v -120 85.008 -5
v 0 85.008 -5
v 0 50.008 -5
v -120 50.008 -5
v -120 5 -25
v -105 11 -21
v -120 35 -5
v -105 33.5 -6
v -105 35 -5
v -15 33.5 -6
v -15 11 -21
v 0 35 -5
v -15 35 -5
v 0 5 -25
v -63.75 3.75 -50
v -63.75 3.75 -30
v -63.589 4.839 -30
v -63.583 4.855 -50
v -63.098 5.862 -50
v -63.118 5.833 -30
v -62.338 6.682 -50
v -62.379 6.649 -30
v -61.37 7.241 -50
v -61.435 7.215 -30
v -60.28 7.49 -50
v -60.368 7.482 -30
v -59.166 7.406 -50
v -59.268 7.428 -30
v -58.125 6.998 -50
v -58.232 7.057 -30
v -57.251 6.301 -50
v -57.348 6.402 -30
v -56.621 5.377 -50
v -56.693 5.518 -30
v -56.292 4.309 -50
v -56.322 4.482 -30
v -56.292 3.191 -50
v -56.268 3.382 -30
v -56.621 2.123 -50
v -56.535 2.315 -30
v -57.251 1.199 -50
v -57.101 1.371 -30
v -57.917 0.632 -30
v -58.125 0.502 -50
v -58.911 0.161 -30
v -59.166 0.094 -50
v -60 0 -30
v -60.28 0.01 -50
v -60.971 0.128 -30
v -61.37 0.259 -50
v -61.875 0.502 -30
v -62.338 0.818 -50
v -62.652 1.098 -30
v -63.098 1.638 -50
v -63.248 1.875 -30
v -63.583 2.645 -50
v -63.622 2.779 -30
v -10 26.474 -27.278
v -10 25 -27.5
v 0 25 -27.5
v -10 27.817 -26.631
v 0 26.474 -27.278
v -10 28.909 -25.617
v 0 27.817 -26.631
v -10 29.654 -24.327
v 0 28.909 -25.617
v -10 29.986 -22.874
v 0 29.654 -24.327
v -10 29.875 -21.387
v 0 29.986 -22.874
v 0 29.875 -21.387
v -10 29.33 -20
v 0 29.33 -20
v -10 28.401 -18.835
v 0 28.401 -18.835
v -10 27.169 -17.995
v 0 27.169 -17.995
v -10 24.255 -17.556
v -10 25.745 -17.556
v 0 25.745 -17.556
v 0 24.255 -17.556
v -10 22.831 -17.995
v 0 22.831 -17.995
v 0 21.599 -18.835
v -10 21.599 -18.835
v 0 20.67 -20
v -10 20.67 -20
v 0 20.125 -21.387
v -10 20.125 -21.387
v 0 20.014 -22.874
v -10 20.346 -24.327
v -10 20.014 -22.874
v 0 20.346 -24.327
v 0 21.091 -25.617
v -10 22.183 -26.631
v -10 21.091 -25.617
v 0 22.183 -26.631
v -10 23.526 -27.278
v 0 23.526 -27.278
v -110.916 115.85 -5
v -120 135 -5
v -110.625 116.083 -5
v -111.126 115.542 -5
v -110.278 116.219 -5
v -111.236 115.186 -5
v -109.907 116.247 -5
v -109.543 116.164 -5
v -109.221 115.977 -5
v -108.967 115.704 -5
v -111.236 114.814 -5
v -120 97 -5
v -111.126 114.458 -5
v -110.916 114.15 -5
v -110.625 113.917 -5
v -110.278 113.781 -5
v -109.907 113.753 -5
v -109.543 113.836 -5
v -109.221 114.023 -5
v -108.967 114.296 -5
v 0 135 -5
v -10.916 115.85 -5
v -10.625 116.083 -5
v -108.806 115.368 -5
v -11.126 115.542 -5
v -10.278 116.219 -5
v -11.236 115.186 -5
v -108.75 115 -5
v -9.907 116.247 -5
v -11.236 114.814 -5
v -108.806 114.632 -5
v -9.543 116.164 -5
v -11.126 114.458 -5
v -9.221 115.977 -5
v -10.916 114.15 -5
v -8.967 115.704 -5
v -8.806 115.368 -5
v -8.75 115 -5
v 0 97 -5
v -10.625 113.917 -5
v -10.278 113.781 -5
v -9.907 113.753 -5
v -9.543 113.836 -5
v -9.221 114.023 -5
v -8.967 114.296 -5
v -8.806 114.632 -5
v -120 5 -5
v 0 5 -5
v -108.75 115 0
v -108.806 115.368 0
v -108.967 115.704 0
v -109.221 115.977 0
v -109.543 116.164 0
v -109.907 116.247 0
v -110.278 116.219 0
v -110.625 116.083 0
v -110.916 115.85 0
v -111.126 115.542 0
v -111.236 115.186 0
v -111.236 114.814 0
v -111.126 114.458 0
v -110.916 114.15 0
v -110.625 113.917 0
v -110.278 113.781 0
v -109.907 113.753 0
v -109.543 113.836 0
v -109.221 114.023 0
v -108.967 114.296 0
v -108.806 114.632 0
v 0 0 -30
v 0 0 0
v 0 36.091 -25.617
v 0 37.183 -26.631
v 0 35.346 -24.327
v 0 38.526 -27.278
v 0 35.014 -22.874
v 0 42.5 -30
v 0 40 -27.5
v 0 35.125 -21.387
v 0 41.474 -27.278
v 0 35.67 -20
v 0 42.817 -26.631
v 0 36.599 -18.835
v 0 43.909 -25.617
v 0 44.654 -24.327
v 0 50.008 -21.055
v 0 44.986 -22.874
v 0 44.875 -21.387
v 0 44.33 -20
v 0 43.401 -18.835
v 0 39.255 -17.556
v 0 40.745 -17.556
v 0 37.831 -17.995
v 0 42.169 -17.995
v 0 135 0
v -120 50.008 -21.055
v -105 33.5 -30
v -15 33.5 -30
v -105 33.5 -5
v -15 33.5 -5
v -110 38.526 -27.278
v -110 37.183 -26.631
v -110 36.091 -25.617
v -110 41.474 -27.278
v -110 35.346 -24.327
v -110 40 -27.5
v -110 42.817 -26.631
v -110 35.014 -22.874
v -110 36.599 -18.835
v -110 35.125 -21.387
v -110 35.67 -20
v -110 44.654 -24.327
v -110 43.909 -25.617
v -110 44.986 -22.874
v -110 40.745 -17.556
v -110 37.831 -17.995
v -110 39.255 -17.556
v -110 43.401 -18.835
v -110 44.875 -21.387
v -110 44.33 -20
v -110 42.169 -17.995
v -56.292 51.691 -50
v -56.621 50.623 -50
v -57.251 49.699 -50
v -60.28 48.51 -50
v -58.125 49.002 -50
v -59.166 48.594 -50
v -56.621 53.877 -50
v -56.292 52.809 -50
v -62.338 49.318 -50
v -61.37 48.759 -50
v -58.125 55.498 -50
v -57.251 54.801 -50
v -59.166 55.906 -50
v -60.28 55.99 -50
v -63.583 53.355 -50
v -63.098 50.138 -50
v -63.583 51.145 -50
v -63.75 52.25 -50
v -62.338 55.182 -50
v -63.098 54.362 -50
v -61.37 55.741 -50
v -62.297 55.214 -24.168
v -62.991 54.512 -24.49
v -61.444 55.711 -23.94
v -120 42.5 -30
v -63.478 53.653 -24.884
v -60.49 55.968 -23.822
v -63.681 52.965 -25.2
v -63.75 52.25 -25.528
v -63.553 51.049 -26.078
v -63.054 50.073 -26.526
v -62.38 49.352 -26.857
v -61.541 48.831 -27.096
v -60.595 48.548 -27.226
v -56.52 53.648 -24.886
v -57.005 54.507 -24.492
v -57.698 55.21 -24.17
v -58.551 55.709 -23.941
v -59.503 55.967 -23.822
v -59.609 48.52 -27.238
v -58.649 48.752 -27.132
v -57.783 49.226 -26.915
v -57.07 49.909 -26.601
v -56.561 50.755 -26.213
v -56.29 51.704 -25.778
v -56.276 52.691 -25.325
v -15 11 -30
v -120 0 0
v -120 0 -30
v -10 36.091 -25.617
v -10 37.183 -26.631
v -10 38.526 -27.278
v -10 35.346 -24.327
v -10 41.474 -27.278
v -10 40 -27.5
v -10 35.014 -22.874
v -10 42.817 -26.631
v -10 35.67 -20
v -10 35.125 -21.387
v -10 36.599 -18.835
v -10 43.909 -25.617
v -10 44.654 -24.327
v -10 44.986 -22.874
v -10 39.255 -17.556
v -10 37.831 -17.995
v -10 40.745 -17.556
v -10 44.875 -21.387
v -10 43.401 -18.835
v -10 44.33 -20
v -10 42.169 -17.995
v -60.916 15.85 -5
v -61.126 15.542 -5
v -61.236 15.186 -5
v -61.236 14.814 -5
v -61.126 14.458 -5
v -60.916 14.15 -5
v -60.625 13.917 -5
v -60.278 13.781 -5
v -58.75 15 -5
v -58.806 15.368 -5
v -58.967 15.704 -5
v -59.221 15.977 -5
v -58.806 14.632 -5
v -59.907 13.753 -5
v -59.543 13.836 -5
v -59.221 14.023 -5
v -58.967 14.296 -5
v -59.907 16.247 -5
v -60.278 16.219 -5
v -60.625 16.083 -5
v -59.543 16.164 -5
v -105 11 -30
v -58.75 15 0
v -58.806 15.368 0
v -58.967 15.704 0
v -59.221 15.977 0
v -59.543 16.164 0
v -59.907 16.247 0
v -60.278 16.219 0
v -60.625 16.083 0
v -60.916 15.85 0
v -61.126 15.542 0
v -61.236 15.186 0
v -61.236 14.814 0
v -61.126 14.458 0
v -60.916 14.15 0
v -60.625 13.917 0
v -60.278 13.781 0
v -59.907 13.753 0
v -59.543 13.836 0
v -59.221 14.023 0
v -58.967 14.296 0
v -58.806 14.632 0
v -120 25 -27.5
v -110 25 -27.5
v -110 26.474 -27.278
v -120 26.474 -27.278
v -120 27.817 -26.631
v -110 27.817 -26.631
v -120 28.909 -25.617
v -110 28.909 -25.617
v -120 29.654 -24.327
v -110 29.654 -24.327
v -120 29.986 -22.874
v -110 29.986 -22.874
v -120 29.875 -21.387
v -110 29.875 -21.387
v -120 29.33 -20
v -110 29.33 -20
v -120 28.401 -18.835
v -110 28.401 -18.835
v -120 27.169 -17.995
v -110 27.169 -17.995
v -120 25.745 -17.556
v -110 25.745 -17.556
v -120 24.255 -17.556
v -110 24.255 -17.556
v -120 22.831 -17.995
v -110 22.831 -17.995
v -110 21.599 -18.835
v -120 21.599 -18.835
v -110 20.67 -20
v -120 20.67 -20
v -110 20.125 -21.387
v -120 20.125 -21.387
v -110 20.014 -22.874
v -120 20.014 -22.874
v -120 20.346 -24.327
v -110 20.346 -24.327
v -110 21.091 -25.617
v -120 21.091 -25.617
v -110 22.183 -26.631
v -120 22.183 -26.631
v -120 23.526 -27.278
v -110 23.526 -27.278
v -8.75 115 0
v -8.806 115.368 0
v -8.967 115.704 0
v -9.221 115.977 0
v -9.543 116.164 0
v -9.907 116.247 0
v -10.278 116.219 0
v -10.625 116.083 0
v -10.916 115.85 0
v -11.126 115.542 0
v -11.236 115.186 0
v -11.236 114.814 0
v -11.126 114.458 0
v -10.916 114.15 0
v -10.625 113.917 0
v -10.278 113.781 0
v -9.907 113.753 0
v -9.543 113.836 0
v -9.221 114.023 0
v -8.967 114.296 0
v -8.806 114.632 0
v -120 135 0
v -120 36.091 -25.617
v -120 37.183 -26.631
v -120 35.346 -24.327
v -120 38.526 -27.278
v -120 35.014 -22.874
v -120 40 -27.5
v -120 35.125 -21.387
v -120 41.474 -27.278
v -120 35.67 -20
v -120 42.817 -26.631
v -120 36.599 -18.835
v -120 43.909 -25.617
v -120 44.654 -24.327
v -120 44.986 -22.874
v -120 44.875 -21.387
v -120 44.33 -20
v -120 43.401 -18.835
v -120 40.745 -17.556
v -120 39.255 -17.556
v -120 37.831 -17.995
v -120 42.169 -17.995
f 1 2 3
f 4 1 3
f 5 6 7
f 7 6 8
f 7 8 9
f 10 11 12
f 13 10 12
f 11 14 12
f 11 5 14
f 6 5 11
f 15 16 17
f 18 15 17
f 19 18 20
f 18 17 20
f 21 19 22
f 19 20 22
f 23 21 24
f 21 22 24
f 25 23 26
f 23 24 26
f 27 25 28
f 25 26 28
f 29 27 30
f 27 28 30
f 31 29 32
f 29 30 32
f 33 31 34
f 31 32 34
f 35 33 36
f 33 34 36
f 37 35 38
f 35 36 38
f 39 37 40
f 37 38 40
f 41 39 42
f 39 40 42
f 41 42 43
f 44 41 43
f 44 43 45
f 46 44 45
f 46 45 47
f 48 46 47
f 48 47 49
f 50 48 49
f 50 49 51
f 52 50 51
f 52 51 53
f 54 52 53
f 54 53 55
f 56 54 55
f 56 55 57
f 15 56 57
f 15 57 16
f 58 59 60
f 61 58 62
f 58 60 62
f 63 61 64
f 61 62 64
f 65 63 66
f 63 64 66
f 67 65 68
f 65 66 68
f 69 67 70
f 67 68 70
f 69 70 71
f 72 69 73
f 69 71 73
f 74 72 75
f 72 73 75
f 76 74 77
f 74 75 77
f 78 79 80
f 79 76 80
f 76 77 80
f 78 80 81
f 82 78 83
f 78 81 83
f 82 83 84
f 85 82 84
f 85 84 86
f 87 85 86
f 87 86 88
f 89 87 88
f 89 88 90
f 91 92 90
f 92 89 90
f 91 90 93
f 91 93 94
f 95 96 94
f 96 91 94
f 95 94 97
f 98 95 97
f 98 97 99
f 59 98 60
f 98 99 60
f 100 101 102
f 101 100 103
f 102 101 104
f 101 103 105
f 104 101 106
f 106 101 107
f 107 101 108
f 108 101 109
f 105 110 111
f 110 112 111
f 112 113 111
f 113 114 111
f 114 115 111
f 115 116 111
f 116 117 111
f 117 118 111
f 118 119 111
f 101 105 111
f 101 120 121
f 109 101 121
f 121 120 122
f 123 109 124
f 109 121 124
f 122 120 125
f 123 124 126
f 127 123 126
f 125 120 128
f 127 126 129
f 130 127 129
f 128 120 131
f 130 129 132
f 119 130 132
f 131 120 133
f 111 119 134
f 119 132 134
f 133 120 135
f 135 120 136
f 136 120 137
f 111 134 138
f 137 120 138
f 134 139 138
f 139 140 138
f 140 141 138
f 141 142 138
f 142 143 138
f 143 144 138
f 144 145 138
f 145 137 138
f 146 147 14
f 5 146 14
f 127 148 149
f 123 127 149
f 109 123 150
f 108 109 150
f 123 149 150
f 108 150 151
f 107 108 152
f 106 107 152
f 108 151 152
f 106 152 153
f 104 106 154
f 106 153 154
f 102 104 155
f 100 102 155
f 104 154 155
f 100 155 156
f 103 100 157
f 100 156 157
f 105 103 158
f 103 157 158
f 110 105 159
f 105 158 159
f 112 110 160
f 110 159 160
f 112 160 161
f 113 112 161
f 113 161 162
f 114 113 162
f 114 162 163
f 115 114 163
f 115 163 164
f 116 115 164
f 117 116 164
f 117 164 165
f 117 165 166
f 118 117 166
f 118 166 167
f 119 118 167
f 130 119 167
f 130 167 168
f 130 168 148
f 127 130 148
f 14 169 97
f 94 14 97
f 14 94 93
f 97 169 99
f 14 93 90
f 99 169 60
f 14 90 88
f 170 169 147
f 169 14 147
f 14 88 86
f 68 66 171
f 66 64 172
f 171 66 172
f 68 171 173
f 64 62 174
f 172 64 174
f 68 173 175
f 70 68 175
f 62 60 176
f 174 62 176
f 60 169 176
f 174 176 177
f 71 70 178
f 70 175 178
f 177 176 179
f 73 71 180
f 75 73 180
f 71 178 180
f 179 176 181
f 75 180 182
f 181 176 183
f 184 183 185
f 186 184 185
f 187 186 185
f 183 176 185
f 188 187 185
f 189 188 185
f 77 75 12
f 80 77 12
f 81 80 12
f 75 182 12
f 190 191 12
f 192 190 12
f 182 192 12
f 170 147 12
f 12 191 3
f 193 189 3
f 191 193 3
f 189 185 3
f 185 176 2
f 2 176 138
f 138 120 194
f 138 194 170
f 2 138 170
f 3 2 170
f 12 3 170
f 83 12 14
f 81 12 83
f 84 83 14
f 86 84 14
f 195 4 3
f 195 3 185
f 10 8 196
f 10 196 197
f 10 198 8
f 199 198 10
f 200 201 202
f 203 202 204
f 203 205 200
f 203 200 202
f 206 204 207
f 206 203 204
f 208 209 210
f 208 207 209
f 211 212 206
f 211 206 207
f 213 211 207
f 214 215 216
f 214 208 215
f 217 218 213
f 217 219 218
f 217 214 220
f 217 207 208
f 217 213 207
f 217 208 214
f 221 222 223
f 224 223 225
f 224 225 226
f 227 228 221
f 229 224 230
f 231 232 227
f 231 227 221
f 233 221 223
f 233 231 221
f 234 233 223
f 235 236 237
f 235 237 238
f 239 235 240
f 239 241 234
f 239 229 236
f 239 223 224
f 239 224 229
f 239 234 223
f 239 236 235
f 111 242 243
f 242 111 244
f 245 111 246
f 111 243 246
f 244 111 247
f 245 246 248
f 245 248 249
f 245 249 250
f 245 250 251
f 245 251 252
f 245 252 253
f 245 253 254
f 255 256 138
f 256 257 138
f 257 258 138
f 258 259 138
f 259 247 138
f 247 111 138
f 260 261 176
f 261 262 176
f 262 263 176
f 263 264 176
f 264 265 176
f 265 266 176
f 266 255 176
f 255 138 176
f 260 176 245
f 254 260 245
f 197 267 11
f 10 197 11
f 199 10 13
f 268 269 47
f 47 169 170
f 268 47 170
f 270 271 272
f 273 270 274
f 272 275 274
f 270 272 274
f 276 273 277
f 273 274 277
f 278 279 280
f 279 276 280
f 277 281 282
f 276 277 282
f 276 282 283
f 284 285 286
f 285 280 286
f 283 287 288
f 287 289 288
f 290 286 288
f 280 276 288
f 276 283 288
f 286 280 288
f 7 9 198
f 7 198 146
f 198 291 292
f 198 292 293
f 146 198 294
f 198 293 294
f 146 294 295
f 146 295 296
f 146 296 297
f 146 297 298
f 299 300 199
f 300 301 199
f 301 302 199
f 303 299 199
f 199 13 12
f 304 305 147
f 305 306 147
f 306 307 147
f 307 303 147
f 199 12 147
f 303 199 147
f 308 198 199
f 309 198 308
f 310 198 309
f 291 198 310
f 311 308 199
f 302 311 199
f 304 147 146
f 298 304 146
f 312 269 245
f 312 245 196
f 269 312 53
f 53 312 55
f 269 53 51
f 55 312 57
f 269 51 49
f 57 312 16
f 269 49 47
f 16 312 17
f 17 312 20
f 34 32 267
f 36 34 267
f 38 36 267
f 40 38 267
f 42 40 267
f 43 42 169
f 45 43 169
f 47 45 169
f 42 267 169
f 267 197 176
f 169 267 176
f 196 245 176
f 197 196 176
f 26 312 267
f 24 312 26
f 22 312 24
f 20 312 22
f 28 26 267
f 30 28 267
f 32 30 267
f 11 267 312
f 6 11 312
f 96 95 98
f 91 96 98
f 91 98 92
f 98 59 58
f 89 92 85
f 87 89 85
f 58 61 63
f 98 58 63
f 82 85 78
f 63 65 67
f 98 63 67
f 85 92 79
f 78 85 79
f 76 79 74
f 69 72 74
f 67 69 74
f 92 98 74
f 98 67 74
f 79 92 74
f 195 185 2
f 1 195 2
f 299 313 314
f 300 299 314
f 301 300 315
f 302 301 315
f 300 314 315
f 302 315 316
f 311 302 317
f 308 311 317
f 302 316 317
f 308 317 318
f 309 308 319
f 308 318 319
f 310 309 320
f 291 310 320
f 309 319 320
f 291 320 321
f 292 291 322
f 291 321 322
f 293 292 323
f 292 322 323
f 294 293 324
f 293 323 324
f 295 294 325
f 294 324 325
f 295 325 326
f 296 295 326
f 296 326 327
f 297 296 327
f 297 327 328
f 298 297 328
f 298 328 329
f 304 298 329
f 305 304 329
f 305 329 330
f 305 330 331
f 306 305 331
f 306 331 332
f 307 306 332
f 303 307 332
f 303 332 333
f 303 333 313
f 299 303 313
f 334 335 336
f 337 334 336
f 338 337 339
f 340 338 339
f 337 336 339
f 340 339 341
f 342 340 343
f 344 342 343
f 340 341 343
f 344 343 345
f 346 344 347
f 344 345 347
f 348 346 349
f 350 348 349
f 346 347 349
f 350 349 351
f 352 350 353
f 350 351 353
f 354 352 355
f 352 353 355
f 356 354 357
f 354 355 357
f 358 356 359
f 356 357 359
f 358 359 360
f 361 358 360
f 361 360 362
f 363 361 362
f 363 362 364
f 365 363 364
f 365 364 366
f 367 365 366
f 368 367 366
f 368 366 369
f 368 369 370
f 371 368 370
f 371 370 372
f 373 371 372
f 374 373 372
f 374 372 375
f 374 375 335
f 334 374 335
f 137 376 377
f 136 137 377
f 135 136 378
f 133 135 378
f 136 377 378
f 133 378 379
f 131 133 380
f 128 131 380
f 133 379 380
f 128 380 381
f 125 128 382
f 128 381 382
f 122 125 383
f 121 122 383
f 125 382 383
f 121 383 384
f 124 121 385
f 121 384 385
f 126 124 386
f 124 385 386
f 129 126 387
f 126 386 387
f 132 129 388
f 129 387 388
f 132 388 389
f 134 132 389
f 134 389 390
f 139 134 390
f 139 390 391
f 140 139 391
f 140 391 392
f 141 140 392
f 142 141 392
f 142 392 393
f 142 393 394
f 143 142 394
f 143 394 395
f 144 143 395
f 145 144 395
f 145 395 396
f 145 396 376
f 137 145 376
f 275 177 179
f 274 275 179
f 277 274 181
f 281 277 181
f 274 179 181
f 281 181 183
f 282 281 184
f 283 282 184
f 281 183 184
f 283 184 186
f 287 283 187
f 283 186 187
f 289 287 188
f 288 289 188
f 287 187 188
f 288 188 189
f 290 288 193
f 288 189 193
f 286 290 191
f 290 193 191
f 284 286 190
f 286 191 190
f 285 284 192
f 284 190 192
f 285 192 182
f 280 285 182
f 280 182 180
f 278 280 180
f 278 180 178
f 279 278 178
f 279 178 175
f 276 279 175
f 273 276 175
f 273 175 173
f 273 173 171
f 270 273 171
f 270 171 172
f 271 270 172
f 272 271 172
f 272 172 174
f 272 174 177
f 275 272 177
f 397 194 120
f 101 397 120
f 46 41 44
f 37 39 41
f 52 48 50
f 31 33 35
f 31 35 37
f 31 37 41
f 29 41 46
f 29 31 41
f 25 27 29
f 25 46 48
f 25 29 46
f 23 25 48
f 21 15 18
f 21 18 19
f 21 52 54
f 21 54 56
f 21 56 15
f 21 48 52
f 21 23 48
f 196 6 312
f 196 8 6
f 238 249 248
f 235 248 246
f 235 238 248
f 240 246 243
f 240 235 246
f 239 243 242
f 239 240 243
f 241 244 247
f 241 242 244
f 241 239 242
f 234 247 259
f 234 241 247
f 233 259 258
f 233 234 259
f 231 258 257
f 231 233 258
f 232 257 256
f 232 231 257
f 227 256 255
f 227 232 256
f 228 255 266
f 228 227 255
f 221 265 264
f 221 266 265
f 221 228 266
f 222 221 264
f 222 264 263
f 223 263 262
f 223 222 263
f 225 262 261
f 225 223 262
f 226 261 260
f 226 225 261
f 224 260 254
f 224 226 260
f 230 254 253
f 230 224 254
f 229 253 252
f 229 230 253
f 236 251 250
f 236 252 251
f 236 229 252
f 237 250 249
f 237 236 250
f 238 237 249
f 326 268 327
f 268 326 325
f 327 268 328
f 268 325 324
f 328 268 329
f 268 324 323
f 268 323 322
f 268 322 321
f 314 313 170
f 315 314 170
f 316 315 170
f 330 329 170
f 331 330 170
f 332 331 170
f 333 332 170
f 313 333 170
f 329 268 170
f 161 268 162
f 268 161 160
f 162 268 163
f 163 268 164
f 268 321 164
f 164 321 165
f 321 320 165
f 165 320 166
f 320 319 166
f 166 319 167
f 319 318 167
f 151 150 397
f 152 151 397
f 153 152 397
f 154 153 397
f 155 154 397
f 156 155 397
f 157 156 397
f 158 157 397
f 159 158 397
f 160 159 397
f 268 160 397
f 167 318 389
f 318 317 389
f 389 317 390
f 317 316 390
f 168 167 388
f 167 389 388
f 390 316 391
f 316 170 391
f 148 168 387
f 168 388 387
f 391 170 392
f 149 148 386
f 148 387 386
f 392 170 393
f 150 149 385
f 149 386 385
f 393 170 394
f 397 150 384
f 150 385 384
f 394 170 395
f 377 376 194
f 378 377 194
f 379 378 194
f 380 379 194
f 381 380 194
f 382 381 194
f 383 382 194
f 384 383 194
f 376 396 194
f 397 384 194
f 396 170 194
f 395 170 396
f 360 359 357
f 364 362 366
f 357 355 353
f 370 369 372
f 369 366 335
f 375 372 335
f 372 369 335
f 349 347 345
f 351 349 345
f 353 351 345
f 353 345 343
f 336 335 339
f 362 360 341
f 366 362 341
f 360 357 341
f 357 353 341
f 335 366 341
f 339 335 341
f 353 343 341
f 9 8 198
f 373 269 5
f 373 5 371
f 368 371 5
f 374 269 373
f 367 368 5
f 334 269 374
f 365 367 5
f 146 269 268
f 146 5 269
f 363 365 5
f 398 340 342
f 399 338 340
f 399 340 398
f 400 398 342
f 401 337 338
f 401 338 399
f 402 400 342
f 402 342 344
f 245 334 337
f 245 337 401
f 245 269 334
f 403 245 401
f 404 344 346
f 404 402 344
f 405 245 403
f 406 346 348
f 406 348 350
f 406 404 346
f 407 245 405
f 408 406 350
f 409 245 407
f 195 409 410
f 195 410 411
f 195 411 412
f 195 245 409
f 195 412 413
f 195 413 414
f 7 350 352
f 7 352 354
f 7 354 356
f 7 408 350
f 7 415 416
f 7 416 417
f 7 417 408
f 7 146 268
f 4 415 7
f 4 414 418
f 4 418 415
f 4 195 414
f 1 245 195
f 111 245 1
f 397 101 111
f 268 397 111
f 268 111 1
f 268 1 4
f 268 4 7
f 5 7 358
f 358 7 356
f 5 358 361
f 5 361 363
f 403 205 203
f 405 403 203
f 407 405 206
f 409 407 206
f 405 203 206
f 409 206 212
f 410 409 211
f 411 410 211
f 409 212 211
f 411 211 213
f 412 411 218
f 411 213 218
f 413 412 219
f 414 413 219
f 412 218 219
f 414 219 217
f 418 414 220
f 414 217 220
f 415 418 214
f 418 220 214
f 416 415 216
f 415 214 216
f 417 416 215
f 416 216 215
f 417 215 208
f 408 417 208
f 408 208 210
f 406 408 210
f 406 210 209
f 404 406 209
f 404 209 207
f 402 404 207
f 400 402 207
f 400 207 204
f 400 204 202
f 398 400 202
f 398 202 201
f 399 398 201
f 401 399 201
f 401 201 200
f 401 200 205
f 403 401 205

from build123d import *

# Parameters (mm, degrees)
SKETCH1_R                = 5
BOSS_EXTRUDE1_DEPTH      = 120
SKETCH2_R                = 3.75
BOSS_EXTRUDE2_DEPTH      = 20
SKETCH3_R                = 3.75
BOSS_EXTRUDE3_DEPTH      = 20
BOSS_EXTRUDE3_DEPTH_BACK = 15
SKETCH4_R                = 1.25
CUT_EXTRUDE1_DEPTH       = 50
SKETCH5_W                = 90
SKETCH5_H                = 25
CUT_EXTRUDE5_DEPTH       = 25
SKETCH6_R                = 5
BOSS_EXTRUDE4_DEPTH      = 5
SKETCH7_R                = 5
BOSS_EXTRUDE5_DEPTH      = 5
SKETCH8_R                = 5
BOSS_EXTRUDE6_DEPTH      = 95
BOSS_EXTRUDE6_DEPTH_BACK = 5
SKETCH9_W                = 90
SKETCH9_H                = 25
BOSS_EXTRUDE7_DEPTH      = 2.5
SKETCH10_R               = 1.25
CUT_EXTRUDE6_DEPTH       = 22.5
CUT_EXTRUDE7_DEPTH       = 120


with BuildPart() as part:
    # Sketch1 → Boss-Extrude1 (new body)
    with BuildSketch(Plane(origin=(0, 0, 0), x_dir=(0, 0, -1), z_dir=(1, 0, 0))):
        Polygon((0, 0), (0, 135), (5, 135), (5, 97), (30, 42.5), (30, 0), align=None)
        with Locations((22.5, 40)):
            Circle(SKETCH1_R, mode=Mode.SUBTRACT)
        with Locations((22.5, 25)):
            Circle(SKETCH1_R, mode=Mode.SUBTRACT)
        Polygon((25, 5), (5, 35), (5, 5), align=None, mode=Mode.SUBTRACT)
    extrude(amount=-BOSS_EXTRUDE1_DEPTH)

    # Sketch2 → Boss-Extrude2 (add)
    with BuildSketch(Plane(origin=(0, 0, -30), x_dir=(-1, 0, 0), z_dir=(0, 0, -1))):
        with Locations((60, 3.75)):
            Circle(SKETCH2_R)
    extrude(amount=BOSS_EXTRUDE2_DEPTH)

    # Sketch3 → Boss-Extrude3 (add, two sides)
    with BuildSketch(Plane(origin=(0, 0, -30), x_dir=(-1, 0, 0), z_dir=(0, 0, -1))) as boss_extrude3_sk:
        with Locations((60, 52.25)):
            Circle(SKETCH3_R)
    extrude(amount=BOSS_EXTRUDE3_DEPTH)
    extrude(boss_extrude3_sk.sketch, amount=-BOSS_EXTRUDE3_DEPTH_BACK)

    # Sketch4 → Cut-Extrude1 (cut)
    with BuildSketch(Plane.XY):
        with Locations((-60, 15)):
            Circle(SKETCH4_R)
    extrude(amount=-CUT_EXTRUDE1_DEPTH, mode=Mode.SUBTRACT)

    # Sketch5 → Cut-Extrude5 (cut)
    with BuildSketch(Plane(origin=(0, 0, -30), x_dir=(-1, 0, 0), z_dir=(0, 0, -1))):
        with Locations((60, 23.5)):
            Rectangle(SKETCH5_W, SKETCH5_H)
    extrude(amount=-CUT_EXTRUDE5_DEPTH, mode=Mode.SUBTRACT)

    # Sketch6 → Boss-Extrude4 (add)
    with BuildSketch(Plane.ZY.offset(15)):
        with Locations((-22.5, 25)):
            Circle(SKETCH6_R)
    extrude(amount=-BOSS_EXTRUDE4_DEPTH)

    # Sketch7 → Boss-Extrude5 (add)
    with BuildSketch(Plane(origin=(-105, 0, 0), x_dir=(0, 0, -1), z_dir=(1, 0, 0))):
        with Locations((22.5, 25)):
            Circle(SKETCH7_R)
    extrude(amount=-BOSS_EXTRUDE5_DEPTH)

    # Sketch8 → Boss-Extrude6 (add, two sides)
    with BuildSketch(Plane.ZY.offset(15)) as boss_extrude6_sk:
        with Locations((-22.5, 40)):
            Circle(SKETCH8_R)
    extrude(amount=BOSS_EXTRUDE6_DEPTH)
    extrude(boss_extrude6_sk.sketch, amount=-BOSS_EXTRUDE6_DEPTH_BACK)

    # Sketch9 → Boss-Extrude7 (add)
    with BuildSketch(Plane.XZ.offset(-36)):
        with Locations((-60, -17.5)):
            Rectangle(SKETCH9_W, SKETCH9_H)
    extrude(amount=BOSS_EXTRUDE7_DEPTH)

    # Sketch10 → Cut-Extrude6 (cut)
    with BuildSketch(Plane.XY):
        with Locations((-110, 115)):
            Circle(SKETCH10_R)
        with Locations((-10, 115)):
            Circle(SKETCH10_R)
    extrude(amount=-CUT_EXTRUDE6_DEPTH, mode=Mode.SUBTRACT)

    # Sketch11 → Cut-Extrude7 (cut)
    with BuildSketch(Plane(origin=(0, 0, 0), x_dir=(0, 0, -1), z_dir=(1, 0, 0))):
        Polygon((5, 85.00791928), (5, 50.00791928), (21.055045872, 50.00791928), align=None)
    extrude(amount=-CUT_EXTRUDE7_DEPTH, mode=Mode.SUBTRACT)


solid = part.part
